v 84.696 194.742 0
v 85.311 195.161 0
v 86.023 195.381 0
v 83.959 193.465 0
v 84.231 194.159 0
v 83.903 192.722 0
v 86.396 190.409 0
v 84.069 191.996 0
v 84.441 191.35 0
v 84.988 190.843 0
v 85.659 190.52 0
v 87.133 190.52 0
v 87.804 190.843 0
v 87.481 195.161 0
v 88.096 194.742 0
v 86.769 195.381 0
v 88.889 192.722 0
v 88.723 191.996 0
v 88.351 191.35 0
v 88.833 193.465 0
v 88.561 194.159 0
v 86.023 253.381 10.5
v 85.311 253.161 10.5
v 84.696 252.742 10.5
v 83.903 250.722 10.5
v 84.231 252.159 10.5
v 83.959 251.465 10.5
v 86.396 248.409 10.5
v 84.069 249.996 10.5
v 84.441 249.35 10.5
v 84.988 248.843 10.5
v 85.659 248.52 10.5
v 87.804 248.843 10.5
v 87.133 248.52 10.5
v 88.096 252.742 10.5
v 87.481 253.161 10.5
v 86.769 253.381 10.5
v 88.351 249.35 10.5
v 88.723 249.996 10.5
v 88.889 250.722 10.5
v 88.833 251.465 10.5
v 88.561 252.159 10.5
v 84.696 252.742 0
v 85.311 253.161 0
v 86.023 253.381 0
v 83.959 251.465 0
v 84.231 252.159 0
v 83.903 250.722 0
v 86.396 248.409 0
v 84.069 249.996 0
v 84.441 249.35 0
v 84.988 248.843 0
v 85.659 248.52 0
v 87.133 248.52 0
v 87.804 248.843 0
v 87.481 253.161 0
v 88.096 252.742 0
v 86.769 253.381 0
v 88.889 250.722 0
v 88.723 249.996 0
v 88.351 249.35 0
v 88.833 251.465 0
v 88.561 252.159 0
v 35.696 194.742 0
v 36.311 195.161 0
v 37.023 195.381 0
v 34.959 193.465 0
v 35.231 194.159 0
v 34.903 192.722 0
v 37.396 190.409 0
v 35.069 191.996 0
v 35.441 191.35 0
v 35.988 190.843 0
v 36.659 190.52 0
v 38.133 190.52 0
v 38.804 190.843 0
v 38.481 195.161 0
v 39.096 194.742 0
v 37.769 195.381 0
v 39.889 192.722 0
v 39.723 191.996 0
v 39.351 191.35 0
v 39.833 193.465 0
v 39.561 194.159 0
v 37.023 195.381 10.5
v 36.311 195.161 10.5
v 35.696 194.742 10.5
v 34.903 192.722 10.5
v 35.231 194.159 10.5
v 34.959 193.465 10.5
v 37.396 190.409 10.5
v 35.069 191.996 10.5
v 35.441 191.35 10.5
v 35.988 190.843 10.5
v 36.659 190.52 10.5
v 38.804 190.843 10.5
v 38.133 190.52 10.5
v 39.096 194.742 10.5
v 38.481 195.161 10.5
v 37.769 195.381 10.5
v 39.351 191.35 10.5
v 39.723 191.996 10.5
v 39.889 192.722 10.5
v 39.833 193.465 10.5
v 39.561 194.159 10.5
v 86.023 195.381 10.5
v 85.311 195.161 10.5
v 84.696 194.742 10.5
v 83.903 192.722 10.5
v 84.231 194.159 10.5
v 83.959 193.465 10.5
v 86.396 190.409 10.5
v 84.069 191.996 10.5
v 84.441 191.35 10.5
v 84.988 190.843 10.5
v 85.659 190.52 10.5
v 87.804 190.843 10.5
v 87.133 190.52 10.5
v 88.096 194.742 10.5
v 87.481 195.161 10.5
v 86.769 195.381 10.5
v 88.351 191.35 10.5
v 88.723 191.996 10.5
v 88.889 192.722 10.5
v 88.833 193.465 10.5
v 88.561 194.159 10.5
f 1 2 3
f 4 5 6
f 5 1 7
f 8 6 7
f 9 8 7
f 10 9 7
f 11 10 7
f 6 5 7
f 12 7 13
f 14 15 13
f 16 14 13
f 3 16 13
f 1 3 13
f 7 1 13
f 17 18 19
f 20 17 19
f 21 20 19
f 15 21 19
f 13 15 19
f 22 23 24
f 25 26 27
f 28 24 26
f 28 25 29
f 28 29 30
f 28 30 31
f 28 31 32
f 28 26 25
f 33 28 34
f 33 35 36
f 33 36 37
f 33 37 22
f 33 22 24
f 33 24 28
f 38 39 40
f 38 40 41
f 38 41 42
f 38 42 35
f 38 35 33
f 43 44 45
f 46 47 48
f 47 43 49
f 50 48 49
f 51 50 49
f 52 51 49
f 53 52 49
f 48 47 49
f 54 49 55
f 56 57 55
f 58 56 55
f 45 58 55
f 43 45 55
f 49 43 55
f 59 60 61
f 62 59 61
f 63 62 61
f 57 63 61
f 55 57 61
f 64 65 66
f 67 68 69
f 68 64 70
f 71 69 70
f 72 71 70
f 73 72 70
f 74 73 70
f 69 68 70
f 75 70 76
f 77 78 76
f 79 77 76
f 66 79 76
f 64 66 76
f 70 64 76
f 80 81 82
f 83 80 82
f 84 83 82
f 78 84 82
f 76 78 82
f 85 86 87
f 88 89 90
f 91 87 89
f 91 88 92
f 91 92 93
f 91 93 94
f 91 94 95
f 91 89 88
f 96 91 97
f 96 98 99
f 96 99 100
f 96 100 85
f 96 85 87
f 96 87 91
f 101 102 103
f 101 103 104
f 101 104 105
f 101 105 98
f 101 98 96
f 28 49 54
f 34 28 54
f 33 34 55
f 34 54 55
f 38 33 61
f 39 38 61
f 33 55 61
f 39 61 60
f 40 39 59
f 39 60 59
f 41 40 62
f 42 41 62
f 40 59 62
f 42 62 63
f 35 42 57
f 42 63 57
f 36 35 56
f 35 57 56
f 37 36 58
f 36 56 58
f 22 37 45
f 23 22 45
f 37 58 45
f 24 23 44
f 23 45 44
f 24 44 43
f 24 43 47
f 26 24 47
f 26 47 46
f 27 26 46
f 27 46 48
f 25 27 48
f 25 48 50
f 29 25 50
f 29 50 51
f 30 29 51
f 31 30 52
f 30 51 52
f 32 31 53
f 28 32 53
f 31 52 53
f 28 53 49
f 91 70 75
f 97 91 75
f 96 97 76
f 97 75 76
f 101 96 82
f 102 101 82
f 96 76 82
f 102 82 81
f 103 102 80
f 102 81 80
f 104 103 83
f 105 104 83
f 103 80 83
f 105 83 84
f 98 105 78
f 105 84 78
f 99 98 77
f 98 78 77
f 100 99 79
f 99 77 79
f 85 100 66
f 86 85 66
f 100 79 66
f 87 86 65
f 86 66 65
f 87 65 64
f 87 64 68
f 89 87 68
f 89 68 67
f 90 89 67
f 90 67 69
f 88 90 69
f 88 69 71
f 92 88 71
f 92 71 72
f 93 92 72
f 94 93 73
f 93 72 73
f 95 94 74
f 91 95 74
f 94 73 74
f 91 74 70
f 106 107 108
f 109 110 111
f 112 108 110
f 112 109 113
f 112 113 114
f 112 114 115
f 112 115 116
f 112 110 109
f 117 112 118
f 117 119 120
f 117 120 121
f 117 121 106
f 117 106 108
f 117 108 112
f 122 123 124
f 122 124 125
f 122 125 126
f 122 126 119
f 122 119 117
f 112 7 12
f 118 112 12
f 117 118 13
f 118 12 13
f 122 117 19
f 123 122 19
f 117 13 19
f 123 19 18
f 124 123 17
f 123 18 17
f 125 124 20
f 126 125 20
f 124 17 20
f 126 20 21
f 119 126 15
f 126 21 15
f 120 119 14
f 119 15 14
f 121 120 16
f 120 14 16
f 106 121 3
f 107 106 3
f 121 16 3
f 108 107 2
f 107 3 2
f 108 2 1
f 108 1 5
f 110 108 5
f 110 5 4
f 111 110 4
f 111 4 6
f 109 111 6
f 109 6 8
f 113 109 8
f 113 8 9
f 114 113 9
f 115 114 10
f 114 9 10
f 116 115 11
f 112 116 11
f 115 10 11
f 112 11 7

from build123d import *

# Parameters (mm, degrees)
SKETCH1_R             = 2.5
BOSS_EXTRUDE1_DEPTH   = 10.500000794
BOSS_EXTRUDE1_2_DEPTH = 10.500000794
BOSS_EXTRUDE1_3_DEPTH = 10.500000794


with BuildPart() as part:
    # Sketch1 → Boss-Extrude1 (new body)
    with BuildSketch(Plane.XY):
        with Locations(Location((37.395999908, 192.908996582, 0), (0, 0, 270))):
            Circle(SKETCH1_R)
    extrude(amount=BOSS_EXTRUDE1_DEPTH)


with BuildPart() as body_2:
    # Sketch1 → Boss-Extrude1 2 (new body)
    with BuildSketch(Plane.XY):
        with Locations(Location((86.395999908, 192.908996582, 0), (0, 0, 270))):
            Circle(SKETCH1_R)
    extrude(amount=BOSS_EXTRUDE1_2_DEPTH)


with BuildPart() as body_3:
    # Sketch1 → Boss-Extrude1 3 (new body)
    with BuildSketch(Plane.XY):
        with Locations(Location((86.395999908, 250.908996582, 0), (0, 0, 270))):
            Circle(SKETCH1_R)
    extrude(amount=BOSS_EXTRUDE1_3_DEPTH)


solid = Compound([part.part, body_2.part, body_3.part])
